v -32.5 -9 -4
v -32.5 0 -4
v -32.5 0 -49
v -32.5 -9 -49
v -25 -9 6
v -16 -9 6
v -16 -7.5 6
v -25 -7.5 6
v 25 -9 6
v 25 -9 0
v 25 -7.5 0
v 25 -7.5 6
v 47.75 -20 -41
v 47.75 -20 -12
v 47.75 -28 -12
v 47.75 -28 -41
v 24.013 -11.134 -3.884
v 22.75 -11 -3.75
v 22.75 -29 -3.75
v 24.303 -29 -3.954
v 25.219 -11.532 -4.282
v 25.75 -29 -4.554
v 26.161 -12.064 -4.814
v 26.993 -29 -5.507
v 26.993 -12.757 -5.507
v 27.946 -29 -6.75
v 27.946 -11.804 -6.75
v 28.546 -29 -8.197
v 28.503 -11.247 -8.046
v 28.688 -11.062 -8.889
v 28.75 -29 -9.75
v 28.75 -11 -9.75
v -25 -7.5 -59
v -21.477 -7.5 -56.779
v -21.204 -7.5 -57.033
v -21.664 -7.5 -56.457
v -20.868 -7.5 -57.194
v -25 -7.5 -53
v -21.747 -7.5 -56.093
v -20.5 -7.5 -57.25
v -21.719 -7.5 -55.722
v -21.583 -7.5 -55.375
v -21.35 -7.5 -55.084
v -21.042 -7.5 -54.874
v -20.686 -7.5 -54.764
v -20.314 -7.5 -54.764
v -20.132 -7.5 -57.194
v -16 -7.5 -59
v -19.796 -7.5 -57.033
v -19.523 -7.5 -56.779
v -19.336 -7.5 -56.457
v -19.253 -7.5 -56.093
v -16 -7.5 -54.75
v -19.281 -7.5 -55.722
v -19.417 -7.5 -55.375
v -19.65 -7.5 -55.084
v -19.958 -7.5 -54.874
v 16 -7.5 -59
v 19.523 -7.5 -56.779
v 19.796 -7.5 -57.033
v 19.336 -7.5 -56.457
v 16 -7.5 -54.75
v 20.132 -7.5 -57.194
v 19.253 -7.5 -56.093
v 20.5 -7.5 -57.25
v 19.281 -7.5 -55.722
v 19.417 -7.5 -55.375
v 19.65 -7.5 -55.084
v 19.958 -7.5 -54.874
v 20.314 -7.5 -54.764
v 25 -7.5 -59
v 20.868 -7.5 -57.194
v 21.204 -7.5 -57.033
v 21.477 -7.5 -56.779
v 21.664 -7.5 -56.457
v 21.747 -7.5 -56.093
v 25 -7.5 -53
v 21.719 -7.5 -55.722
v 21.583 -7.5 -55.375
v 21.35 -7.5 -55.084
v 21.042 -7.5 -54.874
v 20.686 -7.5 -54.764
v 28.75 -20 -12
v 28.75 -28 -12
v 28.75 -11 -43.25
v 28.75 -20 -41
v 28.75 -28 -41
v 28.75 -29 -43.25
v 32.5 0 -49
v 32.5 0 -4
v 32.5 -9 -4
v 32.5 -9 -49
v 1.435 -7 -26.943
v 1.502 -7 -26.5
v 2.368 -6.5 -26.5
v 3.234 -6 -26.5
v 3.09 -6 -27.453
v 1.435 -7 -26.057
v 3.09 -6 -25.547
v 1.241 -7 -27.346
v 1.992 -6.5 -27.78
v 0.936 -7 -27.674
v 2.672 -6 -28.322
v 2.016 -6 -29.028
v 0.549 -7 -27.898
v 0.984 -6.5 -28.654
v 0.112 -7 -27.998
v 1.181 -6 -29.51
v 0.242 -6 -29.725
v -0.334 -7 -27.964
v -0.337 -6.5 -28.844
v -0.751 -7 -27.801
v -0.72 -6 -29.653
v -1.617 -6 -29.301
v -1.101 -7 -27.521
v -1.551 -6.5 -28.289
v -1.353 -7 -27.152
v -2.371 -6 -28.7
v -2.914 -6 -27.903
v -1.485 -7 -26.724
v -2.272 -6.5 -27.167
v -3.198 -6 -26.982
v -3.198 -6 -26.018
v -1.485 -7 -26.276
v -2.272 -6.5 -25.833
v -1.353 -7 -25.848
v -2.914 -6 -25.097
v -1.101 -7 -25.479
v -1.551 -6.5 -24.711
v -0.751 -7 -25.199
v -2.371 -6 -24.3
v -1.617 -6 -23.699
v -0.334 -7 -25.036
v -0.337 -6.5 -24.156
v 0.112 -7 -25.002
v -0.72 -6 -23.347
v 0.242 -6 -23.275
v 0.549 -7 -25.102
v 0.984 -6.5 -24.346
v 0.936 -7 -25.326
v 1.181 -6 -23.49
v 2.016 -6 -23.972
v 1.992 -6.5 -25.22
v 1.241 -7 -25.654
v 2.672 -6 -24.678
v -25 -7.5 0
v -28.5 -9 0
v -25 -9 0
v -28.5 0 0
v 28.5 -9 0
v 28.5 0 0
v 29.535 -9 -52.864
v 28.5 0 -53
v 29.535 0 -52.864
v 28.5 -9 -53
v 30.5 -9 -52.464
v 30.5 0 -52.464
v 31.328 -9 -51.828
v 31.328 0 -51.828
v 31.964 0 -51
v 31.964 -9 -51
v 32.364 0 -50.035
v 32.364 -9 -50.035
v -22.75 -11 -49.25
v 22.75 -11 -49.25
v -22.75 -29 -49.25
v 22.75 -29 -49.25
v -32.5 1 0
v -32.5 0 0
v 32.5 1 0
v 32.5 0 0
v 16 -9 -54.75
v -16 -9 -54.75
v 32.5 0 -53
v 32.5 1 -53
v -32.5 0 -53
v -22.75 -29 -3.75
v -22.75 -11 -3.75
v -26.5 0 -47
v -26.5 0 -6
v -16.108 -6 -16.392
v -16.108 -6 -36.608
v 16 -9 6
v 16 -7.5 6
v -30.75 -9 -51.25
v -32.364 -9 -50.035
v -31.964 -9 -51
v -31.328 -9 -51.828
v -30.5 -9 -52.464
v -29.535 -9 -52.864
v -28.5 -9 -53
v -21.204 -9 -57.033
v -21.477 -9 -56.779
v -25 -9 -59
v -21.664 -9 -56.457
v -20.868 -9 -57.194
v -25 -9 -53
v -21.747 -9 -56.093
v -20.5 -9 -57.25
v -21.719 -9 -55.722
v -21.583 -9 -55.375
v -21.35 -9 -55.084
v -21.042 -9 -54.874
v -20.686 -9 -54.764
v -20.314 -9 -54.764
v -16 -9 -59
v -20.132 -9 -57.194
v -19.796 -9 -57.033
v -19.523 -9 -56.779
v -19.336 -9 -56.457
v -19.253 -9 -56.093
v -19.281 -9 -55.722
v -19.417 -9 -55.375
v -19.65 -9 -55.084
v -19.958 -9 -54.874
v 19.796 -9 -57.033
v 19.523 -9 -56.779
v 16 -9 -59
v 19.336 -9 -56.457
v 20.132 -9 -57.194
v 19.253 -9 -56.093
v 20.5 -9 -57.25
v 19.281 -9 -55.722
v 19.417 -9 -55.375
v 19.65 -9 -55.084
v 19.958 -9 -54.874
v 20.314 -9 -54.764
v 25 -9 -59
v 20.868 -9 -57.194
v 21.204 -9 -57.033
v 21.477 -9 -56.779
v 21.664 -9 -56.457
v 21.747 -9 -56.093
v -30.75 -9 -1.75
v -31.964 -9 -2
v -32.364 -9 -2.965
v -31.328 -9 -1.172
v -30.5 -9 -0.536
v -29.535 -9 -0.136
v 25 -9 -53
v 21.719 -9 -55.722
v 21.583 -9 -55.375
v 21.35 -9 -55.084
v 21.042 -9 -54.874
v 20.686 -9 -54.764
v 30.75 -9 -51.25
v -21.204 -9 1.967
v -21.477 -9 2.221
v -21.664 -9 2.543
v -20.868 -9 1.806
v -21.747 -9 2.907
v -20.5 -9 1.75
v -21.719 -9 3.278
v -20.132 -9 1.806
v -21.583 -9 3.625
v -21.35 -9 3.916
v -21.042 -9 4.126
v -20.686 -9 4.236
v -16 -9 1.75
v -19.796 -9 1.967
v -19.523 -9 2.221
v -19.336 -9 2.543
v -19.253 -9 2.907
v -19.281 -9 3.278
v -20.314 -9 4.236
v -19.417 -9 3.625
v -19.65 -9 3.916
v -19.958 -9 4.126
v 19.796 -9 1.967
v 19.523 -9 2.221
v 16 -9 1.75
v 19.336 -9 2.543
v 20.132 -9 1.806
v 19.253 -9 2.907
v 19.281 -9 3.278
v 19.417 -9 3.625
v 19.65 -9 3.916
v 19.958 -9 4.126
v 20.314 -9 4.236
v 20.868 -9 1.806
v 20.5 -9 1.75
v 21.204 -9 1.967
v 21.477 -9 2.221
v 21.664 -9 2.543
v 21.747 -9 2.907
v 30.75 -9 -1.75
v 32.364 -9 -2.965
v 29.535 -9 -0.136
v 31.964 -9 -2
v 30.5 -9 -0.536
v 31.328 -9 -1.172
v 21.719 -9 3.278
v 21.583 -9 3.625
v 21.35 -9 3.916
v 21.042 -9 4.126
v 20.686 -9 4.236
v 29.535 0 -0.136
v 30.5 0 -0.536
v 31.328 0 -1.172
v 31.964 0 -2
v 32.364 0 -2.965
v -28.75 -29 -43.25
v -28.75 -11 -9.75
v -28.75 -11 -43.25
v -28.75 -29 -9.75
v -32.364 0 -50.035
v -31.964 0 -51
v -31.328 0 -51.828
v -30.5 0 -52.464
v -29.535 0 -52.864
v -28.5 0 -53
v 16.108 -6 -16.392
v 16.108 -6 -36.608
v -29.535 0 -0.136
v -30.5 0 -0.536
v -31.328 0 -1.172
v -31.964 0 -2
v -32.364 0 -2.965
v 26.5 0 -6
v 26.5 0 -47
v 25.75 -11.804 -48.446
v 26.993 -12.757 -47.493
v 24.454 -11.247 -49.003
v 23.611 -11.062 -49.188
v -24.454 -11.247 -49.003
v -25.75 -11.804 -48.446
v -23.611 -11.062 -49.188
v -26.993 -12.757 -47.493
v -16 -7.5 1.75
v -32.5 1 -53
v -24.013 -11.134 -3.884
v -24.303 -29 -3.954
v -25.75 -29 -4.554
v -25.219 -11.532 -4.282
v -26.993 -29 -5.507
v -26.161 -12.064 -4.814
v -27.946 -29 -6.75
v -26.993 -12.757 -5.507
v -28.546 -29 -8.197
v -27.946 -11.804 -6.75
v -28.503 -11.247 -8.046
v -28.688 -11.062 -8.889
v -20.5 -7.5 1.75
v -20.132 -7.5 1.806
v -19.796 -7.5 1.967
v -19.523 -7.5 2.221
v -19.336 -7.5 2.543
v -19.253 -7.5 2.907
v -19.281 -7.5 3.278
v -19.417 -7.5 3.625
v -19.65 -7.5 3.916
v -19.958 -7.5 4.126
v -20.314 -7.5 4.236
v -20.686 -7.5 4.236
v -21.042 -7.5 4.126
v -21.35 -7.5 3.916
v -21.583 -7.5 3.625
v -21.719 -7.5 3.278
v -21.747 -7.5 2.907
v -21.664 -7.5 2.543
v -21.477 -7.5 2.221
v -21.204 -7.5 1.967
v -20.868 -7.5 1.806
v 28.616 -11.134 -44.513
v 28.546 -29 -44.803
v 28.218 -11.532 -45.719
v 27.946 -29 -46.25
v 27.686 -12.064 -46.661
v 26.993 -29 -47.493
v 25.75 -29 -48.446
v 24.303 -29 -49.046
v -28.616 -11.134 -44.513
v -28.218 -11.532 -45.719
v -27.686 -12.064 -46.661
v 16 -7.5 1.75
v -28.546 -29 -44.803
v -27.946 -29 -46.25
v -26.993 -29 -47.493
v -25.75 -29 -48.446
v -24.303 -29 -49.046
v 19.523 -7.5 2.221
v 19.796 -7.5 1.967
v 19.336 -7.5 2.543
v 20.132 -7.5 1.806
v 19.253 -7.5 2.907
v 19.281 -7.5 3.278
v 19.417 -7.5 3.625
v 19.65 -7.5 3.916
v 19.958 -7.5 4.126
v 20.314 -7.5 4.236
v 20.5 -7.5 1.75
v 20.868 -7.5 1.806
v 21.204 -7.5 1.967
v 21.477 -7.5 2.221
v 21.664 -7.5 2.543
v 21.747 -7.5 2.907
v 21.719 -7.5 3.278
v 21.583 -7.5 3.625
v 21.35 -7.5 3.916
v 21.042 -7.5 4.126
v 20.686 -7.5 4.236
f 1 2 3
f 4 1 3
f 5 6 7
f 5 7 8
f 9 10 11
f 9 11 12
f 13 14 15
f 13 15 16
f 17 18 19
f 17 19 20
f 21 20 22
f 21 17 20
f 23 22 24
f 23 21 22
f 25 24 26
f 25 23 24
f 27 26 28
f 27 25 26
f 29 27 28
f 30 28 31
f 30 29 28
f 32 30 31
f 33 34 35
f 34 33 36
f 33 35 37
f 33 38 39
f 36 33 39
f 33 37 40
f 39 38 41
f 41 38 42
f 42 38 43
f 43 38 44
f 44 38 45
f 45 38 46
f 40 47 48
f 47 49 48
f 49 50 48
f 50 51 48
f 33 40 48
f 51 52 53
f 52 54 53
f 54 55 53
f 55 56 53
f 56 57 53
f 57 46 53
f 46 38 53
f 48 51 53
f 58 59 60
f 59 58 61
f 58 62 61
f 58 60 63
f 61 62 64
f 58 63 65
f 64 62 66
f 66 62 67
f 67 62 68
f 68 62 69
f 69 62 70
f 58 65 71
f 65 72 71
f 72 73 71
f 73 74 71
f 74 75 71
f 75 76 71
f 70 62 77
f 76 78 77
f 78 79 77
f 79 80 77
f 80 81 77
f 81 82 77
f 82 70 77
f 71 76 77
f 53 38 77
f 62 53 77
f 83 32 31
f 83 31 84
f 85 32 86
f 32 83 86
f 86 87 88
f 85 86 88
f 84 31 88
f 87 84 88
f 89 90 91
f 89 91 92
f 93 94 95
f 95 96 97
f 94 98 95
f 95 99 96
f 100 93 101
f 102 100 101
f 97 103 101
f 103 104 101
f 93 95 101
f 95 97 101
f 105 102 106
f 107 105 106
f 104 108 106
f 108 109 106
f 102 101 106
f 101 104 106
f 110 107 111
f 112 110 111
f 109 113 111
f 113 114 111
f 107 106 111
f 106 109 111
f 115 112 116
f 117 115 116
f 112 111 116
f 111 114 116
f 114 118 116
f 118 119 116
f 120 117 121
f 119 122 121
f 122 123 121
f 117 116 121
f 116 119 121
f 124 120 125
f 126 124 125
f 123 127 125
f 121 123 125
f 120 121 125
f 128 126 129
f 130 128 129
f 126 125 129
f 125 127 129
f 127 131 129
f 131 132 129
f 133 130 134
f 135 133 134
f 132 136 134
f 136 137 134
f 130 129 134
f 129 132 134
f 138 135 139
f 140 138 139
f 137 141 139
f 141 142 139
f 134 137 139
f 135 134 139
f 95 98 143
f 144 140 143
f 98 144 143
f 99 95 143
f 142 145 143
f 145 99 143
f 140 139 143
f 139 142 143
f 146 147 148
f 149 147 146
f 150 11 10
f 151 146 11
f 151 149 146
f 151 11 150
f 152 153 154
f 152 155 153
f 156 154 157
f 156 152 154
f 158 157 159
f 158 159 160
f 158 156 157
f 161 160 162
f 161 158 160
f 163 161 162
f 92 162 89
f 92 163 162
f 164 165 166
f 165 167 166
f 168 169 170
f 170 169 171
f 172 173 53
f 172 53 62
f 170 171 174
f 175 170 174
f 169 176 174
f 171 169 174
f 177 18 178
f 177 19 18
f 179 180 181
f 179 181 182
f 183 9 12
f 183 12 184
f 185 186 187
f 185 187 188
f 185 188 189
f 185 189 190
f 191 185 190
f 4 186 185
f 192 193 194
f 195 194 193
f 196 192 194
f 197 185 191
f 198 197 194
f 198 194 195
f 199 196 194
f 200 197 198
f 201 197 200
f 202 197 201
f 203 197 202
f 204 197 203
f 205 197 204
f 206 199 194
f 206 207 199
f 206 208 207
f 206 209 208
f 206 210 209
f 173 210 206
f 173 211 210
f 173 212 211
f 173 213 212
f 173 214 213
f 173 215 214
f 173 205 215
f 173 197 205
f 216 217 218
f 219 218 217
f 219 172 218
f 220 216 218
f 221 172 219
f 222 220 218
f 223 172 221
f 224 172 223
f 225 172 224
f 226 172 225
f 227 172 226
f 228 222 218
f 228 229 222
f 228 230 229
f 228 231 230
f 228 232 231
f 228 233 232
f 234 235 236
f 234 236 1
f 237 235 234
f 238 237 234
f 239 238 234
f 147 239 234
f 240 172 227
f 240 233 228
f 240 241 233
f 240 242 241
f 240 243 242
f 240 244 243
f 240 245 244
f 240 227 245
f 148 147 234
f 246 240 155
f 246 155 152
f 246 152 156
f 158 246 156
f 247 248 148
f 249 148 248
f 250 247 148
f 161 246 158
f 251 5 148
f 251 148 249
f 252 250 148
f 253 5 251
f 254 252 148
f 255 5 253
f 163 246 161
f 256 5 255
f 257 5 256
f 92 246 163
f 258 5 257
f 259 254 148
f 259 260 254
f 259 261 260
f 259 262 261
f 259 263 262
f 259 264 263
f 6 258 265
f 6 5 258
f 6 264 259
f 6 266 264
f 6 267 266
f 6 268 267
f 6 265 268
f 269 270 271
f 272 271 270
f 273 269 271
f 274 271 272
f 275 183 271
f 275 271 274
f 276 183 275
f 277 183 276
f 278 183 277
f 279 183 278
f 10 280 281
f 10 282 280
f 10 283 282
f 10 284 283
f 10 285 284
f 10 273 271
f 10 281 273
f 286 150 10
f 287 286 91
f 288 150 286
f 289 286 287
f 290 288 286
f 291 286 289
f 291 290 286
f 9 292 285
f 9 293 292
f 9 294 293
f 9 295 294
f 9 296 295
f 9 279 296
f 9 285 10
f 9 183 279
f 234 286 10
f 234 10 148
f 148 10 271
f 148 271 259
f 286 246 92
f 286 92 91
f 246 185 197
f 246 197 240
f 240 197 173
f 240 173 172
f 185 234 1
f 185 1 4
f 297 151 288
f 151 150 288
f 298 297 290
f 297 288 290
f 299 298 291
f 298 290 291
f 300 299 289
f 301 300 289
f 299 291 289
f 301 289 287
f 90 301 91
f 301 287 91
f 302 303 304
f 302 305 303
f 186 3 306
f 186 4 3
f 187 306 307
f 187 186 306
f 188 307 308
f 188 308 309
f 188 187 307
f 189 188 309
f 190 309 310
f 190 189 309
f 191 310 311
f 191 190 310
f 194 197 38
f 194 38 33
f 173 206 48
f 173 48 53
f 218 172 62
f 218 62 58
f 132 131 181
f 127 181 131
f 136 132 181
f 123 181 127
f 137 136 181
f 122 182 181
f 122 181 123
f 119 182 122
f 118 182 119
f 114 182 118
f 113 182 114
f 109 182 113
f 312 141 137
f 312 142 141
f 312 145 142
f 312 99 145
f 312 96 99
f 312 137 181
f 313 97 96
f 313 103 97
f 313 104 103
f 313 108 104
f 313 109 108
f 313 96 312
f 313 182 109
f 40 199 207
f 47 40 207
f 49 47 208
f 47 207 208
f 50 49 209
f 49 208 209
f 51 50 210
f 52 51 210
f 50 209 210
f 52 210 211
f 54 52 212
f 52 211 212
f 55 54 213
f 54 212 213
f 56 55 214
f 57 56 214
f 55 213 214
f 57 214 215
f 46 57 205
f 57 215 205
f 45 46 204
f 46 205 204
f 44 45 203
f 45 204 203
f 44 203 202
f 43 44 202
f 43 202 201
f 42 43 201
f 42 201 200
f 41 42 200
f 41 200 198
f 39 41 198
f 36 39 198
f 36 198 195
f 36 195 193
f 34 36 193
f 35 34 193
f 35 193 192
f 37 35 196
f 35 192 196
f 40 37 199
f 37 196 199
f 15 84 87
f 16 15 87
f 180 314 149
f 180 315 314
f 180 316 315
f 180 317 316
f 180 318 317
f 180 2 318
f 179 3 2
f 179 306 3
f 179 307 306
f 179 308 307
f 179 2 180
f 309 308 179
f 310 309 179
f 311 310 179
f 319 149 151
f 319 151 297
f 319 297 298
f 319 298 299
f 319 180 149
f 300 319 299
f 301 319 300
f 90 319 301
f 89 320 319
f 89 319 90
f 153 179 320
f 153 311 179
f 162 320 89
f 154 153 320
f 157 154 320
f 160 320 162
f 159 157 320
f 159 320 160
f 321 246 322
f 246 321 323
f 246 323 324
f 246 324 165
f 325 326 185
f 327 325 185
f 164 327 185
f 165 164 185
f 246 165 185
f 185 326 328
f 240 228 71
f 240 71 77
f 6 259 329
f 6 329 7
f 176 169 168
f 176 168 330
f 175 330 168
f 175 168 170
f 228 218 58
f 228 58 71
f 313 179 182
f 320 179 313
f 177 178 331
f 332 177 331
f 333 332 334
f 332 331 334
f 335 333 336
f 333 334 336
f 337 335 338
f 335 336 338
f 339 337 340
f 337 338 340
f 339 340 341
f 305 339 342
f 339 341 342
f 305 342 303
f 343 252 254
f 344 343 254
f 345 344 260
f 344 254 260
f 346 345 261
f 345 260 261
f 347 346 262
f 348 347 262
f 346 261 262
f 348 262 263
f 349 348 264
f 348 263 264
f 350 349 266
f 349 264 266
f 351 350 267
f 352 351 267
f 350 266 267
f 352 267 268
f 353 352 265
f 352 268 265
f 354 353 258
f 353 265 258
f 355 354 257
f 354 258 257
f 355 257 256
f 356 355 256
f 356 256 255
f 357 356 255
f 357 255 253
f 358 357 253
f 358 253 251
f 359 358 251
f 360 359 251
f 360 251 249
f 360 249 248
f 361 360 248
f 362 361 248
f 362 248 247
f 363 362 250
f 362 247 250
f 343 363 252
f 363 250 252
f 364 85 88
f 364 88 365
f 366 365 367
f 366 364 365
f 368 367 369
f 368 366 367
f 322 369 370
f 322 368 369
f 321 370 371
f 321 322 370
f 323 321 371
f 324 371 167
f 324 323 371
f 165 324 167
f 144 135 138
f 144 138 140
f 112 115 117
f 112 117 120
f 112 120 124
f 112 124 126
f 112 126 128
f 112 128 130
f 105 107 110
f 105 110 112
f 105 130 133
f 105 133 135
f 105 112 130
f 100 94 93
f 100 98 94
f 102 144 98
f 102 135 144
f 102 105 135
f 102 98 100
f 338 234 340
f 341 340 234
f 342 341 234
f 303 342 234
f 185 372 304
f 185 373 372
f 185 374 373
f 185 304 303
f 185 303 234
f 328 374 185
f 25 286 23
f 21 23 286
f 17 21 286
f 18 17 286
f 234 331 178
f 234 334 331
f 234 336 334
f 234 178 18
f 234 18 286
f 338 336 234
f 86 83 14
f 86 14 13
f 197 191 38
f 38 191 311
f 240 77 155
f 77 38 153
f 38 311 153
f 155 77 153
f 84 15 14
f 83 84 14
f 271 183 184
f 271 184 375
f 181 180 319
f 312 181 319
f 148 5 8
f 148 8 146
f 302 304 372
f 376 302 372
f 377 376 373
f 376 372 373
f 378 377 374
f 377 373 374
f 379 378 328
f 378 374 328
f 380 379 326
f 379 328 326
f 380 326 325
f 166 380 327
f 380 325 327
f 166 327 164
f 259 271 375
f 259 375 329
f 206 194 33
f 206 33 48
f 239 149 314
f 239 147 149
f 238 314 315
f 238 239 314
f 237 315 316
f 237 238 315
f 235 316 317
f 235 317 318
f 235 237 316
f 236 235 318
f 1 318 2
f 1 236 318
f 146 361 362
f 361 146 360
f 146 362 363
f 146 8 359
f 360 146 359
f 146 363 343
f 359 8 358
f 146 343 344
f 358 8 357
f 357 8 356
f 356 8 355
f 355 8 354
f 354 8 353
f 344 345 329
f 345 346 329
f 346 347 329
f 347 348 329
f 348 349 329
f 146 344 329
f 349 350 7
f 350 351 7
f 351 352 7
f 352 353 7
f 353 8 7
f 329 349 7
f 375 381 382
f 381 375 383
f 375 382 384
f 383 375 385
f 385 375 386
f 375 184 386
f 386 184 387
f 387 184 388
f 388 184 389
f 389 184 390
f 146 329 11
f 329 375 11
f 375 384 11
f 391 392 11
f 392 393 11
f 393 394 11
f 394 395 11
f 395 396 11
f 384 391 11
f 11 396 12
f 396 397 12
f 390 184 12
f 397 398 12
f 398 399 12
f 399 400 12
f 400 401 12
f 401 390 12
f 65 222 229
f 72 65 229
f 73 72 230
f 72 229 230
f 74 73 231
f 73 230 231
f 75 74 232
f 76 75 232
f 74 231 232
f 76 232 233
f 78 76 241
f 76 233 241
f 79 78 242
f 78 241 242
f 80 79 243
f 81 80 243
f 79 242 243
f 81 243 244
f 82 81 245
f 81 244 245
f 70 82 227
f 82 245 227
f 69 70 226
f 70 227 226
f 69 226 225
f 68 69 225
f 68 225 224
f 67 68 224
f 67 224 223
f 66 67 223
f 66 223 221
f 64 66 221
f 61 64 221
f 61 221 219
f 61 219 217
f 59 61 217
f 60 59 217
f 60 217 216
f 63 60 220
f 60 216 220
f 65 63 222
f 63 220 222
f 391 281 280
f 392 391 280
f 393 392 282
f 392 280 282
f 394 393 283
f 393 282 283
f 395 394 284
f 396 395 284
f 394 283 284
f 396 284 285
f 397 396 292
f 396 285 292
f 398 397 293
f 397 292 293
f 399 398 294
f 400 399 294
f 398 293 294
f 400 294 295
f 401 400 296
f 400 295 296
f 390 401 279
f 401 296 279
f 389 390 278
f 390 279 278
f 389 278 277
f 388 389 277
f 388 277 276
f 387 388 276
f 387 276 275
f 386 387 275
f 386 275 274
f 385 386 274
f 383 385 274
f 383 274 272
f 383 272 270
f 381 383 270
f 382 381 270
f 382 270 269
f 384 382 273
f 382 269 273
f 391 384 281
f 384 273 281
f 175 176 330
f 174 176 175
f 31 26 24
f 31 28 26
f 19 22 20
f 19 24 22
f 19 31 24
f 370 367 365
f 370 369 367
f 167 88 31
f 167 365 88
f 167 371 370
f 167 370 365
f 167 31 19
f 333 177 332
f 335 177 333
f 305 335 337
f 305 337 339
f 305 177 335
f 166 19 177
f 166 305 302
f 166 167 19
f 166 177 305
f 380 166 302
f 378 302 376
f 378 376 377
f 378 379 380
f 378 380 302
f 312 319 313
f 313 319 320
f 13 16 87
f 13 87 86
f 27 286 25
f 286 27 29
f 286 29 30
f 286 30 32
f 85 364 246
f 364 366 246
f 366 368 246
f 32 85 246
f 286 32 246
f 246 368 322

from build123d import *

# Parameters (mm, degrees)
SKETCH_1_W          = 65
SKETCH_1_H          = 53
EXTRUDE_1_DEPTH     = 9
SKETCH_3_R          = 1.25
EXTRUDE_2_DEPTH     = 1.5
SKETCH_4_W          = 57.5
SKETCH_4_H          = 45.5
EXTRUDE_3_DEPTH     = 20
CHAMFER_1_SIZE      = 2
SKETCH_5_W          = 53
SKETCH_5_H          = 41
CUT_EXTRUDE_1_DEPTH = 6
CUT_EXTRUDE_1_DRAFT = -60
SKETCH_6_W          = 65
SKETCH_6_H          = 53
EXTRUDE_4_DEPTH     = 1
SKETCH_7_R          = 3.233773826
CUT_EXTRUDE_2_DEPTH = 1
CUT_EXTRUDE_2_DRAFT = -60
SKETCH_8_W          = 29
SKETCH_8_H          = 8
EXTRUDE_5_DEPTH     = 19
FILLET_1_R          = 4
FILLET_2_R          = 6


with BuildPart() as part:
    # 草图1 → 凸台-拉伸1 (new body)
    with BuildSketch(Plane(origin=(0, 0, 0), x_dir=(1, 0, 0), z_dir=(0, 1, 0))):
        with Locations((0, 26.5)):
            Rectangle(SKETCH_1_W, SKETCH_1_H)
    extrude(amount=-EXTRUDE_1_DEPTH)

    # 草图3 → 凸台-拉伸2 (add)
    # profile 1 of 3: a face of its own
    with BuildSketch(Plane.XZ.offset(9)):
        Polygon((25, -59), (25, -53), (-25, -53), (-25, -59), (-16, -59), (-16, -54.75), (16, -54.75), (16, -59), align=None)
        with Locations(Location((-20.5, -56, 0), (0, 0, 270))):
            Circle(SKETCH_3_R, mode=Mode.SUBTRACT)
        with Locations(Location((20.5, -56, 0), (0, 0, 270))):
            Circle(SKETCH_3_R, mode=Mode.SUBTRACT)
    # profile 2 of 3: a face of its own
    with BuildSketch(Plane.XZ.offset(9)):
        Polygon((-25, 6), (-25, 0), (0, 0), (0, 1.75), (-16, 1.75), (-16, 6), align=None)
        with Locations(Location((-20.5, 3, 0), (0, 0, 270))):
            Circle(SKETCH_3_R, mode=Mode.SUBTRACT)
    # profile 3 of 3: a face of its own
    with BuildSketch(Plane.XZ.offset(9)):
        Polygon((0, 1.75), (0, 0), (25, 0), (25, 6), (16, 6), (16, 1.75), align=None)
        with Locations(Location((20.5, 3, 0), (0, 0, 270))):
            Circle(SKETCH_3_R, mode=Mode.SUBTRACT)
    extrude(amount=-EXTRUDE_2_DEPTH)

    # 草图4 → 凸台-拉伸3 (add)
    with BuildSketch(Plane(origin=(0, -29, 0), x_dir=(-1, 0, 0), z_dir=(0, -1, 0))):
        with Locations((0, 26.5)):
            Rectangle(SKETCH_4_W, SKETCH_4_H)
    extrude(amount=-EXTRUDE_3_DEPTH)

    # 倒角1
    chamfer_1_edges = [part.edges().sort_by_distance(p)[0] for p in [
        (0, -9, -3.75),
        (-28.75, -9, -26.5),
        (0, -9, -49.25),
        (28.75, -9, -26.5),
    ]]
    chamfer(chamfer_1_edges, length=CHAMFER_1_SIZE)


with BuildPart() as cut_extrude_1_tool:
    # 草图5 → 切除-拉伸1 (with draft: the straight prism first)
    with BuildSketch(Plane(origin=(0, 0, 0), x_dir=(1, 0, 0), z_dir=(0, 1, 0))):
        with Locations((0, 26.5)):
            Rectangle(SKETCH_5_W, SKETCH_5_H)
    extrude(amount=-CUT_EXTRUDE_1_DEPTH)
    # 切除-拉伸1: the draft: its side faces are tilted about the plane it starts from
    cut_extrude_1_sides = [cut_extrude_1_tool.faces().sort_by_distance(p)[0] for p in [
        (-26.5, -3, -26.5),
        (0, -3, -6),
        (26.5, -3, -26.5),
        (0, -3, -47),
    ]]
    draft(cut_extrude_1_sides, Plane(origin=(0, 0, 0), x_dir=(1, 0, 0), z_dir=(0, 1, 0)), CUT_EXTRUDE_1_DRAFT)


with BuildPart() as part_1:
    add(part.part)

    # 切除-拉伸1: cut by cut_extrude_1_tool
    add(cut_extrude_1_tool.part, mode=Mode.SUBTRACT)


with BuildPart() as body_2:
    # 草图6 → 凸台-拉伸4 (new body)
    with BuildSketch(Plane(origin=(0, 0, 0), x_dir=(1, 0, 0), z_dir=(0, 1, 0))):
        with Locations((0, 26.5)):
            Rectangle(SKETCH_6_W, SKETCH_6_H)
    extrude(amount=EXTRUDE_4_DEPTH)


with BuildPart() as cut_extrude_2_tool:
    # 草图7 → 切除-拉伸2 (with draft: the straight prism first)
    with BuildSketch(Plane(origin=(0, -6, 0), x_dir=(1, 0, 0), z_dir=(0, 1, 0))):
        with Locations((0, 26.5)):
            Circle(SKETCH_7_R)
    extrude(amount=-CUT_EXTRUDE_2_DEPTH)
    # 切除-拉伸2: the draft: its side faces are tilted about the plane it starts from
    cut_extrude_2_sides = [cut_extrude_2_tool.faces().sort_by_distance(p)[0] for p in [
        (-3.233773826, -6.5, -26.5),
    ]]
    draft(cut_extrude_2_sides, Plane(origin=(0, -6, 0), x_dir=(1, 0, 0), z_dir=(0, 1, 0)), CUT_EXTRUDE_2_DRAFT)


with BuildPart() as part_2:
    add(part_1.part)

    # 切除-拉伸2: cut by cut_extrude_2_tool
    add(cut_extrude_2_tool.part, mode=Mode.SUBTRACT)

    # 草图8 → 凸台-拉伸5 (add)
    with BuildSketch(Plane(origin=(28.75, 0, 0), x_dir=(0, 0, -1), z_dir=(1, 0, 0))):
        with Locations((26.5, -24)):
            Rectangle(SKETCH_8_W, SKETCH_8_H)
    extrude(amount=EXTRUDE_5_DEPTH)

    # 圆角1
    fillet_1_edges = [part_2.edges().sort_by_distance(p)[0] for p in [
        (-32.5, -4.5, -53),
        (32.5, -4.5, -53),
        (32.5, -4.5, 0),
        (-32.5, -4.5, 0),
    ]]
    fillet(fillet_1_edges, radius=FILLET_1_R)

    # 圆角2
    fillet_2_edges = [part_2.edges().sort_by_distance(p)[0] for p in [
        (28.75, -20, -49.25),
        (28.75, -20, -3.75),
        (-28.75, -20, -49.25),
        (-28.75, -20, -3.75),
    ]]
    fillet(fillet_2_edges, radius=FILLET_2_R)


solid = Compound([body_2.part, part_2.part])
